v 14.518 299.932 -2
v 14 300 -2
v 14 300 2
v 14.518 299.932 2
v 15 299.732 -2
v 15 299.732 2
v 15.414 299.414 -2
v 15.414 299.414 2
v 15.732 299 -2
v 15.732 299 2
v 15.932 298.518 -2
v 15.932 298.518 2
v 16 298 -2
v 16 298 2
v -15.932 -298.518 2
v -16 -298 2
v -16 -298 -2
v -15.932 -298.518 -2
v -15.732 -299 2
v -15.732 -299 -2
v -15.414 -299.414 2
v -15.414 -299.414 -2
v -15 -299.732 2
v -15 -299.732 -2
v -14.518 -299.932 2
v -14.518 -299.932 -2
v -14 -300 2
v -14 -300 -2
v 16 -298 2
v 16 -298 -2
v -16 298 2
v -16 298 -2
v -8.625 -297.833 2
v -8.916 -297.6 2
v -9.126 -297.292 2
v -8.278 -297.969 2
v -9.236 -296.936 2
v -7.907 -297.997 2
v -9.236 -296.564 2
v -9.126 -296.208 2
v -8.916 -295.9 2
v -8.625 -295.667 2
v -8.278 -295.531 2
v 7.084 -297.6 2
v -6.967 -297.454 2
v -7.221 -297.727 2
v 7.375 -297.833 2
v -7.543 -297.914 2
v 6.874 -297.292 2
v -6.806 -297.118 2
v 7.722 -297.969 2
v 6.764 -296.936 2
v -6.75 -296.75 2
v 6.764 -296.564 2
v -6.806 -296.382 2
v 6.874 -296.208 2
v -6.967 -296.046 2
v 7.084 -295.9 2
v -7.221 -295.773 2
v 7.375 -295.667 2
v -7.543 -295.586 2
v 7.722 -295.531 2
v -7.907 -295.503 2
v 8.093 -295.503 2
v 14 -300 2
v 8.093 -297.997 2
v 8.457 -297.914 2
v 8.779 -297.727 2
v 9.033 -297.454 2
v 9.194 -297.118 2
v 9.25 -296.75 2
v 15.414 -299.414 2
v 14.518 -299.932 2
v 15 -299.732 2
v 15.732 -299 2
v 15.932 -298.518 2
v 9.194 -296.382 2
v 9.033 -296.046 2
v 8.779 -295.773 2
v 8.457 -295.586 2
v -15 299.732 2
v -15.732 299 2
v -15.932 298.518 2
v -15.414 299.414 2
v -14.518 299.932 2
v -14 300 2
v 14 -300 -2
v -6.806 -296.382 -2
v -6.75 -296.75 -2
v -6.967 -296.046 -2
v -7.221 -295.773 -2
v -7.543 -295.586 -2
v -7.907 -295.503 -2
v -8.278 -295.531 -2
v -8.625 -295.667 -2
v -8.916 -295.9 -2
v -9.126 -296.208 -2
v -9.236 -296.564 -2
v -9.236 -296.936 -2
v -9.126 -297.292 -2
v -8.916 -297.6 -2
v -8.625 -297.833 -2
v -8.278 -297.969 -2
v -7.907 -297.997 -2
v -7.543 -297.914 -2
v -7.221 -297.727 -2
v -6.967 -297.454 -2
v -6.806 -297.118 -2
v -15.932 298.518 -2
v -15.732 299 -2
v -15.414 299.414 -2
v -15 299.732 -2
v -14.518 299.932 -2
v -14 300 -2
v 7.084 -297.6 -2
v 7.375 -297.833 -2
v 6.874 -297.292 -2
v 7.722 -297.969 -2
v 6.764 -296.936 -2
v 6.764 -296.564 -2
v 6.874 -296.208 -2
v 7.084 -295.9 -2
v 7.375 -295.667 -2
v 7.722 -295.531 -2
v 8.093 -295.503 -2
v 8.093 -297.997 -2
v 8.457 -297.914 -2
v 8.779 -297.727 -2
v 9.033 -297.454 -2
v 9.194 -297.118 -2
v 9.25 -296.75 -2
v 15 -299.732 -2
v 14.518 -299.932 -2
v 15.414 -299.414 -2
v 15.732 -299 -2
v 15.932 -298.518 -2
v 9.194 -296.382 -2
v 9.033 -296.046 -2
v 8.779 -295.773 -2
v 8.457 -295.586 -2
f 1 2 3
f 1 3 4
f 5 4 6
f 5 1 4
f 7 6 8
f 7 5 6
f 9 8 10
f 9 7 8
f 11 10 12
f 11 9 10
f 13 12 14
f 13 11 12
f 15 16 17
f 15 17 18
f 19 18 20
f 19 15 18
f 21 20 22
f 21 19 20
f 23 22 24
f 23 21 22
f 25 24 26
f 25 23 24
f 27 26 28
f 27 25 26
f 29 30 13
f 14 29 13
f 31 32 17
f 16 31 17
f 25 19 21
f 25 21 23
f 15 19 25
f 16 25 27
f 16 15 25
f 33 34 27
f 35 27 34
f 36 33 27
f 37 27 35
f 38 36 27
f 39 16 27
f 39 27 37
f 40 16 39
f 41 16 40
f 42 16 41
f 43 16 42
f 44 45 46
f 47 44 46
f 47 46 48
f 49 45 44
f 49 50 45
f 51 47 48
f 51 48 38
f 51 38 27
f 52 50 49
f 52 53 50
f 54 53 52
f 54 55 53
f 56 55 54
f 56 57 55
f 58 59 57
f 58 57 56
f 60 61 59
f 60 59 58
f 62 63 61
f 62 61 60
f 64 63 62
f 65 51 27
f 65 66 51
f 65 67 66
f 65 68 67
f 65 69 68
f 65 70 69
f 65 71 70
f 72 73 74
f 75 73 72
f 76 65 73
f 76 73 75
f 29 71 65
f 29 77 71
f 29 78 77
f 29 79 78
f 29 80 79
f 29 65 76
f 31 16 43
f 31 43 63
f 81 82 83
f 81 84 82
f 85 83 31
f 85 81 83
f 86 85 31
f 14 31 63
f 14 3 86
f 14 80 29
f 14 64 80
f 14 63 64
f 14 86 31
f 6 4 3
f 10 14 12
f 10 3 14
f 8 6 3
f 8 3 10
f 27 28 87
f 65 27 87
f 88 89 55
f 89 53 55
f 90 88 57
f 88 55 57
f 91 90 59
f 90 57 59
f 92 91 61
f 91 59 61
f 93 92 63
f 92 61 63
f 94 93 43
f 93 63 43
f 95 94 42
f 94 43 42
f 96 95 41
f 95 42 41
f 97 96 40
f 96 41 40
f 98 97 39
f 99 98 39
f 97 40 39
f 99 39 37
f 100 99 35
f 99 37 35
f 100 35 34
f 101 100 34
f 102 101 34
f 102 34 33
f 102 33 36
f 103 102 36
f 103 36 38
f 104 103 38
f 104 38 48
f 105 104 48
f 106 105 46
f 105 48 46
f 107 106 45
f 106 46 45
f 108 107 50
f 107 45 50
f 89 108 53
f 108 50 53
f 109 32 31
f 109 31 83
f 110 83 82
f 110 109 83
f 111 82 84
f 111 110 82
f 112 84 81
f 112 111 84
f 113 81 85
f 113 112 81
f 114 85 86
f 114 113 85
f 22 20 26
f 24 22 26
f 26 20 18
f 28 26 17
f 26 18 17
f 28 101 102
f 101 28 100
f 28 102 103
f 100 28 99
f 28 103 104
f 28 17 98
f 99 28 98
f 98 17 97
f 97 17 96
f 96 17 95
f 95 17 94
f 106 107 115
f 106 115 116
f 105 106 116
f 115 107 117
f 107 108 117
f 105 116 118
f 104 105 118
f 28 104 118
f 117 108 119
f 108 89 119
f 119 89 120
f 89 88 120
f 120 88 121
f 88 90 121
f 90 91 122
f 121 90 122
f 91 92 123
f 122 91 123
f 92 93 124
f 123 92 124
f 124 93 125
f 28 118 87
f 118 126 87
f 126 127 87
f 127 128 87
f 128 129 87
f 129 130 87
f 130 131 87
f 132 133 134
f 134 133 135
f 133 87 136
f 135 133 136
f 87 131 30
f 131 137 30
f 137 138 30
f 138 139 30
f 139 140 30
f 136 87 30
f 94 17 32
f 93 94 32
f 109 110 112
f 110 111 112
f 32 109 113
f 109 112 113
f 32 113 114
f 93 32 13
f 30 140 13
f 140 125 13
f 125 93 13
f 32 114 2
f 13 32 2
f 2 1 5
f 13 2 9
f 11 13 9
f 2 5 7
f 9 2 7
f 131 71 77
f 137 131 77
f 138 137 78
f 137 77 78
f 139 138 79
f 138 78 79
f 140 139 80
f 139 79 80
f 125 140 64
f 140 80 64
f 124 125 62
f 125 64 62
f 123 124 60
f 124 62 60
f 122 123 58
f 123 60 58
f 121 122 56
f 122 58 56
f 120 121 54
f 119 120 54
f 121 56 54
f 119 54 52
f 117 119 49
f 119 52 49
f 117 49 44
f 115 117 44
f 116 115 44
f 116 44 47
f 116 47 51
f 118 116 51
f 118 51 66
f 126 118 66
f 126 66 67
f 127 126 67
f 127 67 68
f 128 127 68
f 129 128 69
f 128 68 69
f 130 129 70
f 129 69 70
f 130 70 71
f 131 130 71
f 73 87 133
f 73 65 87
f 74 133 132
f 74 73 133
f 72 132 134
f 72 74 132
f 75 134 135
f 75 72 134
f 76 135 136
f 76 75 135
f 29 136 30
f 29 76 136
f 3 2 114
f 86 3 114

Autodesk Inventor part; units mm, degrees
ref_plane "YZ Plane" through (0, 0, 0) normal (1, 0, 0) x (0, 1, 0)
ref_plane "XZ Plane" through (0, 0, 0) normal (0, 1, 0) x (-1, 0, 0)
sketch "Эскиз1" plane through (0, 0, 0) normal (0, 0, 1) x (1, 0, 0)
  line L0 (-16, -300) -> (16, -300)
  line L1 (16, -300) -> (16, 300)
  line L2 (16, 300) -> (-16, 300)
  line L3 (-16, 300) -> (-16, -300)
  line L4 (-16, -300) -> (16, 300) construction
  line L5 (16, -300) -> (-16, 300) construction
  point P0 (0, 0)
  dimension "d0" = 600
  dimension "d1" = 32
extrude "Выдавливание1" add sketch "Эскиз1" along normal mid plane 4
fillet "Сопряжение1" radius 2 4 edges at (-16, -300, 0) (16, -300, 0) (16, 300, 0) (-16, 300, 0)
sketch "Эскиз3" plane through (0, 0, 2) normal (0, 0, 1) x (1, 0, 0)
  circle A0 centre (-8, -296.75) radius 1.25 projected
  circle A1 centre (8, -296.75) radius 1.25 projected
  point P0 (0, 0)
ref_plane "РабПлоскость1" through (-309.8315, -315.671, -2) normal (0, 0, 1) x (1, 0, 0)
extrude "Выдавливание3" cut sketch "Эскиз3" against normal up to surface (4 mm away)
properties part number "Фанерка хвоста"
